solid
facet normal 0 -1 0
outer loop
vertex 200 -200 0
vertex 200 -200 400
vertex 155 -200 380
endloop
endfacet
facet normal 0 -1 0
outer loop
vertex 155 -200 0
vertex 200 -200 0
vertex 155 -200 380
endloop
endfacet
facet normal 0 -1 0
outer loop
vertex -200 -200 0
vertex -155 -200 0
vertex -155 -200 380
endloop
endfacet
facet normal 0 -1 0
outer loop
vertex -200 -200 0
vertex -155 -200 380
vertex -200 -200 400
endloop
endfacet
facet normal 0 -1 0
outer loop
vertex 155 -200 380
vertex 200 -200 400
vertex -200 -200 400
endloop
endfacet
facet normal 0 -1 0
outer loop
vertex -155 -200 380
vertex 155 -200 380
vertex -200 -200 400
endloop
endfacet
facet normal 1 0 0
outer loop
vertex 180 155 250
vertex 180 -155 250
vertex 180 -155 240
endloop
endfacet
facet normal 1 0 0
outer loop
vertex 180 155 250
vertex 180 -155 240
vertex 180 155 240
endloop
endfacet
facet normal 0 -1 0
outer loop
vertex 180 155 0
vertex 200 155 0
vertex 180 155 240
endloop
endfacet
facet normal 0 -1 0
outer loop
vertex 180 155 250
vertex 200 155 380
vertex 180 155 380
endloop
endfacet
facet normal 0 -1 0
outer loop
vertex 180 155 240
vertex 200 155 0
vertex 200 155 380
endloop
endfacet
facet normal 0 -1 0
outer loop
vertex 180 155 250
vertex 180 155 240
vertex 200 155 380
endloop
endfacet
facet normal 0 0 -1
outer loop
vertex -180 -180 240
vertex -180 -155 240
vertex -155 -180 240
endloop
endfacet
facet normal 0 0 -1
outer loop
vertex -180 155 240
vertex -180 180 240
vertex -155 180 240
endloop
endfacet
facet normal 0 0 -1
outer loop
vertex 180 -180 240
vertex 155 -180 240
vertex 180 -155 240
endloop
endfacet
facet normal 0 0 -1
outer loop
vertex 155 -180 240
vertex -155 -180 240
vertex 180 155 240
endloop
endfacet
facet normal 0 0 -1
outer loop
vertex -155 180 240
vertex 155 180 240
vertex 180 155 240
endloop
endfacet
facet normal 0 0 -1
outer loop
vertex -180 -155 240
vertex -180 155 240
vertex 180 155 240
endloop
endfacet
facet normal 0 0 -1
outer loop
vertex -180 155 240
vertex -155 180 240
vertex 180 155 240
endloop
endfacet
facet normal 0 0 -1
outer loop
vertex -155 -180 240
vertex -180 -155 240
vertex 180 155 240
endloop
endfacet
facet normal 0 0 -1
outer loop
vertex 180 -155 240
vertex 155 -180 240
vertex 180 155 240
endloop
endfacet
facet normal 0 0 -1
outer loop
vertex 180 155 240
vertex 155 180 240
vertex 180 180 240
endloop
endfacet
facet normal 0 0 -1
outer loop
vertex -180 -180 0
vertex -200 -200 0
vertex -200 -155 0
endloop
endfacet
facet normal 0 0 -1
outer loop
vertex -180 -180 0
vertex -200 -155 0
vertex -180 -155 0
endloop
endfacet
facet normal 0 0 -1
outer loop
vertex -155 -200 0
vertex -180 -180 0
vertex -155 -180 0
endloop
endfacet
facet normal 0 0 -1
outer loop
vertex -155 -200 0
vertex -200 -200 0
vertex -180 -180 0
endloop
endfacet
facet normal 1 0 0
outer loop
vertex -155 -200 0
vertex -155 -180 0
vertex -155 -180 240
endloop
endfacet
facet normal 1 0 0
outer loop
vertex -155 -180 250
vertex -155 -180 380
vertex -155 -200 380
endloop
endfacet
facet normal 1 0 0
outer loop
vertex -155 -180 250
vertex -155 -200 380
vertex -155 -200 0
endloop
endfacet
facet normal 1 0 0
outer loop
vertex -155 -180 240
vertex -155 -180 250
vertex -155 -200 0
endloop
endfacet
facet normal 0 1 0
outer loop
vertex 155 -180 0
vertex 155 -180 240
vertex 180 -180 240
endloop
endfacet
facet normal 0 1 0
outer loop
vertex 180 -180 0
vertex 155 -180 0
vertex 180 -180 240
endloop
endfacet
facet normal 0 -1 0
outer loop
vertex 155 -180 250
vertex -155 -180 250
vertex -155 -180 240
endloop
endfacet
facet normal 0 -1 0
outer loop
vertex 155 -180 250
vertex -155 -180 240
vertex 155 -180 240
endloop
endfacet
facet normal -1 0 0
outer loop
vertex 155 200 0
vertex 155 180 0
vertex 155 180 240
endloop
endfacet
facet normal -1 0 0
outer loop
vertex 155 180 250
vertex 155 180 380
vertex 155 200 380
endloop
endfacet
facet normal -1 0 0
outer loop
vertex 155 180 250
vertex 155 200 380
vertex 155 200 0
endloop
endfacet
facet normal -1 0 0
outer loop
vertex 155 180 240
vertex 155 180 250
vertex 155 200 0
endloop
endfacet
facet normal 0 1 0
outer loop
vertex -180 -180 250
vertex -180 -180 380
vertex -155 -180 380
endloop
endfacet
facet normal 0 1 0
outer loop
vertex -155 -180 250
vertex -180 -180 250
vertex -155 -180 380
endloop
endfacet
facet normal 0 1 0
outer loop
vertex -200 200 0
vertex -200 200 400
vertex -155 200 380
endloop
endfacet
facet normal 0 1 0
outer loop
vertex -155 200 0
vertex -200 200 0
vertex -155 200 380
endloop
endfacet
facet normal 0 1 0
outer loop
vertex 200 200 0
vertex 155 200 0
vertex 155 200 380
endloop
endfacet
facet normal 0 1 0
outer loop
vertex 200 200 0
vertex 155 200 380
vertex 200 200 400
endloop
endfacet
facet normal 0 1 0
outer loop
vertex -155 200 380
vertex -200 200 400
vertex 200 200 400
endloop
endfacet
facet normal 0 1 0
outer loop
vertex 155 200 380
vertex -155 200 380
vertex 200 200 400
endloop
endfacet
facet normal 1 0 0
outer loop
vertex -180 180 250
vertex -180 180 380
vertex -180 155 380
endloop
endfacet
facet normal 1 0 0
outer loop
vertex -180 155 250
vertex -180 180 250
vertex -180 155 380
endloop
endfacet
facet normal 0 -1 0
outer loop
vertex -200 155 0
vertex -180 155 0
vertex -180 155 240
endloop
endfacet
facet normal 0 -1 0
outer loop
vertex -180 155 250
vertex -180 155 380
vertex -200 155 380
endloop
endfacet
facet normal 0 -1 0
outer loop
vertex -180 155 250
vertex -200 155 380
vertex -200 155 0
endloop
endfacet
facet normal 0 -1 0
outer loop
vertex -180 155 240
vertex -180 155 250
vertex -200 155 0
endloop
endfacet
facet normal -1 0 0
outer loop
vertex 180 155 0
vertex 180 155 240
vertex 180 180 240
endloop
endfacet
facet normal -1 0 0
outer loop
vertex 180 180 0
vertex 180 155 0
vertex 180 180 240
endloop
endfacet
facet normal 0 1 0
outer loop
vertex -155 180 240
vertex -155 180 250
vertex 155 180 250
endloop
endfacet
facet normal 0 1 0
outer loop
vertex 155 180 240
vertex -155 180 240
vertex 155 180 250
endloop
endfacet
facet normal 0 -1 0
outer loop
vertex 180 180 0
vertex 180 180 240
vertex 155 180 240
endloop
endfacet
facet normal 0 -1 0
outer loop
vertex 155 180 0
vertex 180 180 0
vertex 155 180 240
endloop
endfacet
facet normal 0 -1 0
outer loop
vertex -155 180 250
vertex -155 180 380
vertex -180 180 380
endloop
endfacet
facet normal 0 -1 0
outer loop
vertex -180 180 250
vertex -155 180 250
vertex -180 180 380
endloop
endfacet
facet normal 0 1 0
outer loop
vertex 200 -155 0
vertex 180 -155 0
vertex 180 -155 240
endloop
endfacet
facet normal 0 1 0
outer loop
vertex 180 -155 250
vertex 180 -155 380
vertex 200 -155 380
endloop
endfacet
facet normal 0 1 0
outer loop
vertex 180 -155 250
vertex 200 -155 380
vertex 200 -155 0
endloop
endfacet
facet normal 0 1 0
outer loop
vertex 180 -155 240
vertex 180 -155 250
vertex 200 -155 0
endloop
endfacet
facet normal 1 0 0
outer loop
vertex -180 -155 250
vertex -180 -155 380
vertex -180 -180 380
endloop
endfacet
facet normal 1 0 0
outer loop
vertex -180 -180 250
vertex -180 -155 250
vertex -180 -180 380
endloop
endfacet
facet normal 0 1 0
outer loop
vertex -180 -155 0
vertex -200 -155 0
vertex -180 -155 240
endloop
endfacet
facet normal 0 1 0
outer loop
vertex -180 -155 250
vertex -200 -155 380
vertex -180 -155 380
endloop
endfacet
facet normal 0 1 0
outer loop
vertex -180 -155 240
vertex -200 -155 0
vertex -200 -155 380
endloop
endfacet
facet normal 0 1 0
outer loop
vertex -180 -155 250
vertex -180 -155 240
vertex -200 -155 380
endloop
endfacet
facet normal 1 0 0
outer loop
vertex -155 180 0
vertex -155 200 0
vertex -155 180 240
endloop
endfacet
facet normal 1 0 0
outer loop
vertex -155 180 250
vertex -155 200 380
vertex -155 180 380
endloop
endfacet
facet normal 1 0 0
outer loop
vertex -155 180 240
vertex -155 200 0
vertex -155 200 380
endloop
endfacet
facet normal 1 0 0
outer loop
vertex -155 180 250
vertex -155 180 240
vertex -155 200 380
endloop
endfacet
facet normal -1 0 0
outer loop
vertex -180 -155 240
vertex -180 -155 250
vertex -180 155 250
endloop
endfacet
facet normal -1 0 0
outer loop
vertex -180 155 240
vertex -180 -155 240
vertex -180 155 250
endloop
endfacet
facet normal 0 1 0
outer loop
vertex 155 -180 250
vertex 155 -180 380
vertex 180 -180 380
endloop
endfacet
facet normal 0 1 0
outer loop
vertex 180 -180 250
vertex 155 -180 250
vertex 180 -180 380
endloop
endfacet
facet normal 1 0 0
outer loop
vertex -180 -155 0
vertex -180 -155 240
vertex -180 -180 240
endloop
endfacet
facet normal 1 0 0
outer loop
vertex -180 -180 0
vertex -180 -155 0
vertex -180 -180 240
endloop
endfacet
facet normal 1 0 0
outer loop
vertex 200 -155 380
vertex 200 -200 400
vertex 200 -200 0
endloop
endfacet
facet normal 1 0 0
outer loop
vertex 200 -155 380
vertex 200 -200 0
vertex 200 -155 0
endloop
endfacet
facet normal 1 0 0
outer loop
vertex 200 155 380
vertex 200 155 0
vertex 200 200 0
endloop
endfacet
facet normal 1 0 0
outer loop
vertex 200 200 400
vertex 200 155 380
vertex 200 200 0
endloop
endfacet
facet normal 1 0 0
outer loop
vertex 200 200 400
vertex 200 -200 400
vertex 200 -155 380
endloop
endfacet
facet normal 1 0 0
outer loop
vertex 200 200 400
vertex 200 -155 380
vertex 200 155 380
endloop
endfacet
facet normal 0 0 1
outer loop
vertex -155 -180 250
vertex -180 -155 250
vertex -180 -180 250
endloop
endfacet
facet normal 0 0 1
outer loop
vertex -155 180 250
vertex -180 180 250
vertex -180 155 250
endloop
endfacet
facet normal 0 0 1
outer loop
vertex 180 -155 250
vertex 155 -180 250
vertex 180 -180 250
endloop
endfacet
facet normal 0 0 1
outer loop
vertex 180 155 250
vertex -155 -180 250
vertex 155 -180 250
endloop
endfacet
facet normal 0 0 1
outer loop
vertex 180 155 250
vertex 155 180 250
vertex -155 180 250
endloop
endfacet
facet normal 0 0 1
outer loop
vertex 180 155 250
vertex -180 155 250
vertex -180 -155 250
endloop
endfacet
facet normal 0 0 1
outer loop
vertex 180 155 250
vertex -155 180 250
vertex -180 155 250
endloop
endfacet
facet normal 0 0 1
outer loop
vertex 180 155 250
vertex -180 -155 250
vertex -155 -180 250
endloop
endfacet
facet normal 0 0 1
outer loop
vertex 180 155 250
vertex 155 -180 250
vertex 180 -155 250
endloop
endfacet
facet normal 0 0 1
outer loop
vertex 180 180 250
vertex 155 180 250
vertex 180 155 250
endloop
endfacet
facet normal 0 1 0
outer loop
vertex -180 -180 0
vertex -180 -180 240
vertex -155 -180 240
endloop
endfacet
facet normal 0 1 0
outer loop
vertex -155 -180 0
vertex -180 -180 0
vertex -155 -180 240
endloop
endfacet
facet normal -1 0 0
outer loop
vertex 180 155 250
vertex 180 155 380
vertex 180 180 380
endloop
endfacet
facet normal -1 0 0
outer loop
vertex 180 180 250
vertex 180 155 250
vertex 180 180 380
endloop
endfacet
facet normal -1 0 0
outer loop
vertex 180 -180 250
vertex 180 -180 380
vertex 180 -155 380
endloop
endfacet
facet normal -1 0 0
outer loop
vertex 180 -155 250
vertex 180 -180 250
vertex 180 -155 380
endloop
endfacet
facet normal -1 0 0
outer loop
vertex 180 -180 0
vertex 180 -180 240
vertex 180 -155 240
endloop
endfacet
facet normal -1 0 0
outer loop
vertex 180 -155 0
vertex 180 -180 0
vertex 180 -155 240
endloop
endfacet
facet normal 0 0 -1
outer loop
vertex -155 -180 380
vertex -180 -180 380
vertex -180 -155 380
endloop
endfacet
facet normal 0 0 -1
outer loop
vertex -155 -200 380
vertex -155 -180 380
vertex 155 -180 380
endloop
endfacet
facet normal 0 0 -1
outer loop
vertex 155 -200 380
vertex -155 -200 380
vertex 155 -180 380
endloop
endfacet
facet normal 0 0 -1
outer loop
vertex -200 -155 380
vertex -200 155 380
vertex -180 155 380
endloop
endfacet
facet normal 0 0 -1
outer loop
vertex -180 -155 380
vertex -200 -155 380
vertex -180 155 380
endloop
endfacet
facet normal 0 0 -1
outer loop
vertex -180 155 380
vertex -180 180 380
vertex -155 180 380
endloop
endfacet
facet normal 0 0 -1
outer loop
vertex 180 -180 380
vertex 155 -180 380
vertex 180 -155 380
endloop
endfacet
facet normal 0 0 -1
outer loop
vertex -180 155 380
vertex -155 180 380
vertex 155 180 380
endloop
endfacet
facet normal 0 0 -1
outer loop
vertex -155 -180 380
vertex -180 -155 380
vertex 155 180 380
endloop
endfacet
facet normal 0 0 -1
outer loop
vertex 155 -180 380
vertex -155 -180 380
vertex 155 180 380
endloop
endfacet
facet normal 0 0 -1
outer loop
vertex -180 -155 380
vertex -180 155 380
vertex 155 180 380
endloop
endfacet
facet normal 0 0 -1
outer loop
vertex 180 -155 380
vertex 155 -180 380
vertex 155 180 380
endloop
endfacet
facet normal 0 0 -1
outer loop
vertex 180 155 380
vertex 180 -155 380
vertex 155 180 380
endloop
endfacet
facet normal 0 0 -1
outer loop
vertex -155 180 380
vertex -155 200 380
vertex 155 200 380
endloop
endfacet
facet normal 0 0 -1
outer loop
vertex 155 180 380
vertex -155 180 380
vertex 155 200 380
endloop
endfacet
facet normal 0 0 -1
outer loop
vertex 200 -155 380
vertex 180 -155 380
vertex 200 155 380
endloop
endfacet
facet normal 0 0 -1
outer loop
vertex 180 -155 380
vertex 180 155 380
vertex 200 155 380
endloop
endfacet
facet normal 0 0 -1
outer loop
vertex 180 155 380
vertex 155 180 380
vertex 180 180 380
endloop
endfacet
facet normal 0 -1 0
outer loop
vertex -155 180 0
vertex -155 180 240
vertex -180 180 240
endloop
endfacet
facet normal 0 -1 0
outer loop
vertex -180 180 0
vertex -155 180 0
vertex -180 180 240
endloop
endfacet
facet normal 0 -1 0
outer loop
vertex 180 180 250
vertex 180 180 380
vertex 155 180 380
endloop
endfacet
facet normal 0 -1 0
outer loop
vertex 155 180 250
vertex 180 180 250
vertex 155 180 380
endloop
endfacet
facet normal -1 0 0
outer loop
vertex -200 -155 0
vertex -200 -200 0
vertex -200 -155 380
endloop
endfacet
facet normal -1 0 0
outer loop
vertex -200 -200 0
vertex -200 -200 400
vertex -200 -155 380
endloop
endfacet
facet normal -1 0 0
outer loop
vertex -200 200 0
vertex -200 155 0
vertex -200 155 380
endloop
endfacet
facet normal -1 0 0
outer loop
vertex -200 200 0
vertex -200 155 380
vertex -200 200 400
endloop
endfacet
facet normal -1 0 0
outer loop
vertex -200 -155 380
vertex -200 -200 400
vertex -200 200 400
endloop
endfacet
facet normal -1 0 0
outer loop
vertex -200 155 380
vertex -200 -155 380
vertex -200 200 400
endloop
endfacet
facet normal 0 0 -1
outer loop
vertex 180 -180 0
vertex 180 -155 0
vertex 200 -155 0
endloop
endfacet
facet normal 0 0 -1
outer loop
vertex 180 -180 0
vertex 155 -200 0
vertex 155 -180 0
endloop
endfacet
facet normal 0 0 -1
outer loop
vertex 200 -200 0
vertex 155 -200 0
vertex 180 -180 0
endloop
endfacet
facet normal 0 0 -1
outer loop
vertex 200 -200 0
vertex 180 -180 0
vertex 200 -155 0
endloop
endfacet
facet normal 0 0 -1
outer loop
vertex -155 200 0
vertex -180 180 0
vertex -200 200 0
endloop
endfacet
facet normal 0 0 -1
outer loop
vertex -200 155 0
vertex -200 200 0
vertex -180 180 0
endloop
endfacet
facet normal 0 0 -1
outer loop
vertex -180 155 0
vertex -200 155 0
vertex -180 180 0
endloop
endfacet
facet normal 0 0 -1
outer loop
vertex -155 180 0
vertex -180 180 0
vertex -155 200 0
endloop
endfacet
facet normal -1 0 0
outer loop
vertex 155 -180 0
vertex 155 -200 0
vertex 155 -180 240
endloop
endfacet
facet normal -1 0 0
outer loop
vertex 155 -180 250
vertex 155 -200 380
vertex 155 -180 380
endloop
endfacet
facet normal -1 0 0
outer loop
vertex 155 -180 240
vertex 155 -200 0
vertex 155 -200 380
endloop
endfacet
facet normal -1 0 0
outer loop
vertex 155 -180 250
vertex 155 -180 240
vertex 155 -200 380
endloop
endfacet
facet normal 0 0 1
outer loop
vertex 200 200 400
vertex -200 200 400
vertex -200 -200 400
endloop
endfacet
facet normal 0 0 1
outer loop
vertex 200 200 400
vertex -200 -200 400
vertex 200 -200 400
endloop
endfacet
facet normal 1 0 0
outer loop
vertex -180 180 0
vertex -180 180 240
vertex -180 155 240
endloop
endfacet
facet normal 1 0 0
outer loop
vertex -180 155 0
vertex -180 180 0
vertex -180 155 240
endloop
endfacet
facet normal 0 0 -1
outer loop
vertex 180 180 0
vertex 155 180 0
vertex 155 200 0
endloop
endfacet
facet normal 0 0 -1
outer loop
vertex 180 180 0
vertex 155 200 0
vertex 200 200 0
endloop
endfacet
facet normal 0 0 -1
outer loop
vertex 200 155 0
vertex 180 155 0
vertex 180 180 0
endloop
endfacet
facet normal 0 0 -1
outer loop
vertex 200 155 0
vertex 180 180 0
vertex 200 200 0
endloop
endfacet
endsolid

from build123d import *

# Parameters (mm, degrees)
F1_W     = 400
F1_H     = 400
F2_DEPTH = 20
F4_DEPTH = 380
F6_W     = 360
F6_H     = 360
F7_DEPTH = 10


with BuildPart() as f2:
    # F1 (on offset) → F2 (new body)
    with BuildSketch(Plane.XY.offset(400)):
        Rectangle(F1_W, F1_H)
    extrude(amount=-F2_DEPTH)

    # F3 (on face) → F4 (join, through all)
    with BuildSketch(Plane(origin=(0, 0, 380), x_dir=(1, 0, 0), z_dir=(0, 0, -1))):
        Polygon((-155, 200), (-200, 200), (-200, 155), (-180, 155), (-180, 180), (-155, 180), align=None)
        Polygon((155, 180), (180, 180), (180, 155), (200, 155), (200, 200), (155, 200), align=None)
        Polygon((200, -200), (200, -155), (180, -155), (180, -180), (155, -180), (155, -200), align=None)
        Polygon((-180, -180), (-180, -155), (-200, -155), (-200, -200), (-155, -200), (-155, -180), align=None)
    extrude(amount=F4_DEPTH)

    # F6 (on offset) → F7 (join)
    with BuildSketch(Plane.XY.offset(250)):
        Rectangle(F6_W, F6_H)
    extrude(amount=-F7_DEPTH)


solid = f2.part
